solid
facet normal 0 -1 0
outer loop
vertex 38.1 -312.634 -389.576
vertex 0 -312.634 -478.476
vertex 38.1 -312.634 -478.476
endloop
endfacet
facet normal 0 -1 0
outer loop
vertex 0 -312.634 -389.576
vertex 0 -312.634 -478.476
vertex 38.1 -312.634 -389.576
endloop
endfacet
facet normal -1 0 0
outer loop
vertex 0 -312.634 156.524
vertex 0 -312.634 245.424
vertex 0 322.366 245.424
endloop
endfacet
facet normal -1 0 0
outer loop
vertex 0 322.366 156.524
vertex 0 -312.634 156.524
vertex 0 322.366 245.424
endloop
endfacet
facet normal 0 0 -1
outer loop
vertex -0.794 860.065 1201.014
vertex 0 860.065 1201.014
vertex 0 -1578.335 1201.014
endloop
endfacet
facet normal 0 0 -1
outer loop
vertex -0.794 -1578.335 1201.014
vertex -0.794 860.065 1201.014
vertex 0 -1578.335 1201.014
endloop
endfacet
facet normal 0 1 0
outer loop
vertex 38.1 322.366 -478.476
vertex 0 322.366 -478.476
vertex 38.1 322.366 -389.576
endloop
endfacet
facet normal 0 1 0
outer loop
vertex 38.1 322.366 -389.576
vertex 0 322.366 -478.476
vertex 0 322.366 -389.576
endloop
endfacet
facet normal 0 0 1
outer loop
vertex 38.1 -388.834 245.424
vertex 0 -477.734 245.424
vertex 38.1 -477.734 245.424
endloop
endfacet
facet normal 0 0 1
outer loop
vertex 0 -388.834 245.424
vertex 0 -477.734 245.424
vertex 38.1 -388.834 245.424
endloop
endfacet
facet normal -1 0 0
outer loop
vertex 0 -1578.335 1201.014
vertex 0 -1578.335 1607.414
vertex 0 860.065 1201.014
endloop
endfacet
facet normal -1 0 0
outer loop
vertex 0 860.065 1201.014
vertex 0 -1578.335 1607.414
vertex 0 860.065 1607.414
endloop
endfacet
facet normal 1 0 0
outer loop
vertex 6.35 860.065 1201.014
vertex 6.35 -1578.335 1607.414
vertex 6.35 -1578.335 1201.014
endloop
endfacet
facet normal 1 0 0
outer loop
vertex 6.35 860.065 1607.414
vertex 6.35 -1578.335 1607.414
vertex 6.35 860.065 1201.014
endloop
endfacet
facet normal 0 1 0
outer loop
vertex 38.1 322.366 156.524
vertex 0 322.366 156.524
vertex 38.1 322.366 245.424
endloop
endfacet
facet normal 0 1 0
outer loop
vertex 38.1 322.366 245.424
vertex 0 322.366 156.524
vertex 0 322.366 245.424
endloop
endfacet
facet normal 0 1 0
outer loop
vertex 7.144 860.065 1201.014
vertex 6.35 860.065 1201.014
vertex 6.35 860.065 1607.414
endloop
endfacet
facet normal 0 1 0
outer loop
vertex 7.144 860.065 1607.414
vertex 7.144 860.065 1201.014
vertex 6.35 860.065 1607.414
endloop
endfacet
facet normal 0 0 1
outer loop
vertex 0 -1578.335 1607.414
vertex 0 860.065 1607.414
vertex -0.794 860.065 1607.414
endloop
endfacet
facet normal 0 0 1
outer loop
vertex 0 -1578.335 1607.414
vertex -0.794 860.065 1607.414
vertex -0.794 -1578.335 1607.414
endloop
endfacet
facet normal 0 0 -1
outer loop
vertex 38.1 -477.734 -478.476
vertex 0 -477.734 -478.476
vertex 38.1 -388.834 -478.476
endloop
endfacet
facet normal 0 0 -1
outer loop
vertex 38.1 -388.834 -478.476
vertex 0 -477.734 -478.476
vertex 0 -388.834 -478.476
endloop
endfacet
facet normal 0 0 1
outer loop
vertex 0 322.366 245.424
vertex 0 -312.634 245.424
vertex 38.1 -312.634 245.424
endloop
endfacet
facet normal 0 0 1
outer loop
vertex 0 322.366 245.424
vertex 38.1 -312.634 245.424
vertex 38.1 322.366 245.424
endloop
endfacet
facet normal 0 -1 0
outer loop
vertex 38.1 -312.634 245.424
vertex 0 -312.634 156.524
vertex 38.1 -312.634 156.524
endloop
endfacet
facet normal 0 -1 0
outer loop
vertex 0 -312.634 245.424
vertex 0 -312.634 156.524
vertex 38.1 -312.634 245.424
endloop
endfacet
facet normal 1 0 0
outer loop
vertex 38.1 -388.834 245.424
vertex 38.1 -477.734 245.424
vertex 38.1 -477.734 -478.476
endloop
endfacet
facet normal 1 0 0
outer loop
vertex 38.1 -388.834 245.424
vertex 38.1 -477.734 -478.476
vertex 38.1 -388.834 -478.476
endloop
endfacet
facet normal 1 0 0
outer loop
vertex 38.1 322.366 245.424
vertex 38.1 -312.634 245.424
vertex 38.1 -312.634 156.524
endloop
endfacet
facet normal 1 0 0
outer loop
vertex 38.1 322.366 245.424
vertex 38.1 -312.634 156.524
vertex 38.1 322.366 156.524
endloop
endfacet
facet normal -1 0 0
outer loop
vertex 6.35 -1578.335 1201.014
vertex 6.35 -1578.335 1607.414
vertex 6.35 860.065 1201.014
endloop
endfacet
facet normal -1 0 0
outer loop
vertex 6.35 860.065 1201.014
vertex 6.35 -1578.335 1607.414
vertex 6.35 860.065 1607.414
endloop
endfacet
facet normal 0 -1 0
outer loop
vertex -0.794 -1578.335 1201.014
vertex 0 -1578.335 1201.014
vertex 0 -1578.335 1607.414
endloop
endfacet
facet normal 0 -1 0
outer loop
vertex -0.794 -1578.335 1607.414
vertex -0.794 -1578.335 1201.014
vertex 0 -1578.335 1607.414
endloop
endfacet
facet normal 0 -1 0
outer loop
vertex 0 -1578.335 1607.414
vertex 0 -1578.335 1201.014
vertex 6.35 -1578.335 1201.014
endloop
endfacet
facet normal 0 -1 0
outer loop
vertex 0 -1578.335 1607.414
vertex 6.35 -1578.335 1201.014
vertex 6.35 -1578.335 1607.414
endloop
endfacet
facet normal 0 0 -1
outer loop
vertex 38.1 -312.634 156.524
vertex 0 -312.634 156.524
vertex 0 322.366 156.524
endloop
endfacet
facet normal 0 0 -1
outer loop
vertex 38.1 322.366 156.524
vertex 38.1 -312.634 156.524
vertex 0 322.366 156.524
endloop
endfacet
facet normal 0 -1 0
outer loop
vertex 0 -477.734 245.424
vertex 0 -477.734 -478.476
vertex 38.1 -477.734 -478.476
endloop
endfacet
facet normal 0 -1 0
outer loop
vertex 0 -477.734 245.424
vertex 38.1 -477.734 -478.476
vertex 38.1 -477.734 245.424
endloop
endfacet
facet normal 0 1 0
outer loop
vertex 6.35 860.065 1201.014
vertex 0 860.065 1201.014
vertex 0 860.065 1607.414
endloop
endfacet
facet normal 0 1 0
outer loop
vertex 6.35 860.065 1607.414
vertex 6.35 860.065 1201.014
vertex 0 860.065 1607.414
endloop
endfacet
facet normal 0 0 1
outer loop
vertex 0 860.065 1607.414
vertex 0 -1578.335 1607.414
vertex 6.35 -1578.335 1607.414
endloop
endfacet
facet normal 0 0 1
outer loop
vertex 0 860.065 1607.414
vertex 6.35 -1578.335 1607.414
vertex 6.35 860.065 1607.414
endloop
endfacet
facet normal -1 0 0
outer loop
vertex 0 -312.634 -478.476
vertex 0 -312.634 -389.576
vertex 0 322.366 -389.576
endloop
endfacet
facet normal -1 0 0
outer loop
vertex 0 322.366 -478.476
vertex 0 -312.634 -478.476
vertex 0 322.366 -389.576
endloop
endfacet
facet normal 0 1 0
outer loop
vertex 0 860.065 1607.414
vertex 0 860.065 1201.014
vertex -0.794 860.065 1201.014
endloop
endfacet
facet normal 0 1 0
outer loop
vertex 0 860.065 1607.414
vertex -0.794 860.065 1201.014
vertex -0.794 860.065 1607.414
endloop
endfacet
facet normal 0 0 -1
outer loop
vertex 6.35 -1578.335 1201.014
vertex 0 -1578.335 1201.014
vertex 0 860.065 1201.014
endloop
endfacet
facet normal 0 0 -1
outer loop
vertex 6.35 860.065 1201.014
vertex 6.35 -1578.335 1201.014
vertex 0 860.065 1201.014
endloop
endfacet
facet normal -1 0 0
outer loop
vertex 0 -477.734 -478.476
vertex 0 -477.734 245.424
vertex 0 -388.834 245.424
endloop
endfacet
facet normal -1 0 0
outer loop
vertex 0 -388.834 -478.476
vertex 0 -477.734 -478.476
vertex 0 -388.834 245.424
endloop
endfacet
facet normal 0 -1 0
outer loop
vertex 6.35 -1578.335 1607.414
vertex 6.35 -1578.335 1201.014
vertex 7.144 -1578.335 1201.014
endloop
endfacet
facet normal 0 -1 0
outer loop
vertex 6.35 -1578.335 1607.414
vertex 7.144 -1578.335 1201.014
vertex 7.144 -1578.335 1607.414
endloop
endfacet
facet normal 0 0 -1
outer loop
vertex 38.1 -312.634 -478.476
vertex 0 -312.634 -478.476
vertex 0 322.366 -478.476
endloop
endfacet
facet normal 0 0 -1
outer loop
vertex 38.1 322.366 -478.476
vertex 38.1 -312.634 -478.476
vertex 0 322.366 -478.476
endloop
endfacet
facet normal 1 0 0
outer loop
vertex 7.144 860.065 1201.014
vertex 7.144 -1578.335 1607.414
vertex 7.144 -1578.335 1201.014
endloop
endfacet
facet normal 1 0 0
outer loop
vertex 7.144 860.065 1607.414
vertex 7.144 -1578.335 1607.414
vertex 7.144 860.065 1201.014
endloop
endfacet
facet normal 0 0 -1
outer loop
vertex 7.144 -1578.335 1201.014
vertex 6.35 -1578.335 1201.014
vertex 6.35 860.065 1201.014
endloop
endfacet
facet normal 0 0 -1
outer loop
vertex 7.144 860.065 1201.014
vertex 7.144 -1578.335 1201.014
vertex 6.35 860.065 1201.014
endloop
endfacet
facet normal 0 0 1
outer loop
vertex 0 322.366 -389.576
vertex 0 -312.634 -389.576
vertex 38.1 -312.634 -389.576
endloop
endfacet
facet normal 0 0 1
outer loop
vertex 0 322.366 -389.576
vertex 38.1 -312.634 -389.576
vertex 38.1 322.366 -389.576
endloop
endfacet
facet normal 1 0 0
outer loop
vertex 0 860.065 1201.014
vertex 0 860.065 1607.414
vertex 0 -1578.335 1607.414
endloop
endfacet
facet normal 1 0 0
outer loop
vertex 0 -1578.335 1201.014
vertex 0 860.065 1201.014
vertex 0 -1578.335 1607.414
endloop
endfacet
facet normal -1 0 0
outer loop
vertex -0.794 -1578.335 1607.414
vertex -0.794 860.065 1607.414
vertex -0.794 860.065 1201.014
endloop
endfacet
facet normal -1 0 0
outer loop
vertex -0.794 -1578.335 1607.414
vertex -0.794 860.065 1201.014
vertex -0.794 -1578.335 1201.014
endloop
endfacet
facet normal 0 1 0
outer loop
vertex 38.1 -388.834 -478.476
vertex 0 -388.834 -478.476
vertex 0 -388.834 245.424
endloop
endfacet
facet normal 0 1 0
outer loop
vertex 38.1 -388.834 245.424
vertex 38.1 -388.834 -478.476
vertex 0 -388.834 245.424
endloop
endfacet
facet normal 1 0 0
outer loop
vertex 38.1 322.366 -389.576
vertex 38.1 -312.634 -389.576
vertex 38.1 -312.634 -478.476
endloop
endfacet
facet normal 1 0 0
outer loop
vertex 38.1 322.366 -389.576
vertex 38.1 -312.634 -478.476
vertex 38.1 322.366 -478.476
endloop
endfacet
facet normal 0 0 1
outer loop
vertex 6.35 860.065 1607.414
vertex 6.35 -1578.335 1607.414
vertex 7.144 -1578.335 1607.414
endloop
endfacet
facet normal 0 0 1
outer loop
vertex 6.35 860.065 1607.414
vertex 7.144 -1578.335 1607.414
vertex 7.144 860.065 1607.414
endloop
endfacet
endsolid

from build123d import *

# Parameters (mm, degrees)
F0_W     = 88.9
F0_H     = 723.9
F0_W_2   = 635
F0_H_2   = 88.9
F1_DEPTH = 38.1
F2_W     = 2438.4
F2_H     = 406.4
F3_DEPTH = 6.35
F4_W     = 2438.4
F4_H     = 406.4
F5_DEPTH = 0.79375
F6_W     = 2438.4
F6_H     = 406.4
F7_DEPTH = 0.79375


with BuildPart() as f1:
    # F0 (on Right) → F1 (new body)
    with BuildSketch(Plane.YZ):
        with Locations((-433.283936, -116.526383)):
            Rectangle(F0_W, F0_H)
        with Locations((4.866064, -434.026375)):
            Rectangle(F0_W_2, F0_H_2)
        with Locations((4.866064, 200.973617)):
            Rectangle(F0_W_2, F0_H_2)
    extrude(amount=F1_DEPTH)


with BuildPart() as f3:
    # F2 (on Right) → F3 (new body)
    with BuildSketch(Plane.YZ):
        with Locations((-359.135404, 1404.214156)):
            Rectangle(F2_W, F2_H)
    extrude(amount=F3_DEPTH)


with BuildPart() as f5:
    # F4 (on face) → F5 (new body)
    with BuildSketch(Plane.YZ.offset(6.35)):
        with Locations((-359.135404, 1404.214156)):
            Rectangle(F4_W, F4_H)
    extrude(amount=F5_DEPTH)


with BuildPart() as f7:
    # F6 (on face) → F7 (new body)
    with BuildSketch(Plane(origin=(0, 0, 0), x_dir=(0, -1, 0), z_dir=(-1, 0, 0))):
        with Locations((359.135404, 1404.214156)):
            Rectangle(F6_W, F6_H)
    extrude(amount=F7_DEPTH)


solid = Compound([f1.part, f3.part, f5.part, f7.part])
